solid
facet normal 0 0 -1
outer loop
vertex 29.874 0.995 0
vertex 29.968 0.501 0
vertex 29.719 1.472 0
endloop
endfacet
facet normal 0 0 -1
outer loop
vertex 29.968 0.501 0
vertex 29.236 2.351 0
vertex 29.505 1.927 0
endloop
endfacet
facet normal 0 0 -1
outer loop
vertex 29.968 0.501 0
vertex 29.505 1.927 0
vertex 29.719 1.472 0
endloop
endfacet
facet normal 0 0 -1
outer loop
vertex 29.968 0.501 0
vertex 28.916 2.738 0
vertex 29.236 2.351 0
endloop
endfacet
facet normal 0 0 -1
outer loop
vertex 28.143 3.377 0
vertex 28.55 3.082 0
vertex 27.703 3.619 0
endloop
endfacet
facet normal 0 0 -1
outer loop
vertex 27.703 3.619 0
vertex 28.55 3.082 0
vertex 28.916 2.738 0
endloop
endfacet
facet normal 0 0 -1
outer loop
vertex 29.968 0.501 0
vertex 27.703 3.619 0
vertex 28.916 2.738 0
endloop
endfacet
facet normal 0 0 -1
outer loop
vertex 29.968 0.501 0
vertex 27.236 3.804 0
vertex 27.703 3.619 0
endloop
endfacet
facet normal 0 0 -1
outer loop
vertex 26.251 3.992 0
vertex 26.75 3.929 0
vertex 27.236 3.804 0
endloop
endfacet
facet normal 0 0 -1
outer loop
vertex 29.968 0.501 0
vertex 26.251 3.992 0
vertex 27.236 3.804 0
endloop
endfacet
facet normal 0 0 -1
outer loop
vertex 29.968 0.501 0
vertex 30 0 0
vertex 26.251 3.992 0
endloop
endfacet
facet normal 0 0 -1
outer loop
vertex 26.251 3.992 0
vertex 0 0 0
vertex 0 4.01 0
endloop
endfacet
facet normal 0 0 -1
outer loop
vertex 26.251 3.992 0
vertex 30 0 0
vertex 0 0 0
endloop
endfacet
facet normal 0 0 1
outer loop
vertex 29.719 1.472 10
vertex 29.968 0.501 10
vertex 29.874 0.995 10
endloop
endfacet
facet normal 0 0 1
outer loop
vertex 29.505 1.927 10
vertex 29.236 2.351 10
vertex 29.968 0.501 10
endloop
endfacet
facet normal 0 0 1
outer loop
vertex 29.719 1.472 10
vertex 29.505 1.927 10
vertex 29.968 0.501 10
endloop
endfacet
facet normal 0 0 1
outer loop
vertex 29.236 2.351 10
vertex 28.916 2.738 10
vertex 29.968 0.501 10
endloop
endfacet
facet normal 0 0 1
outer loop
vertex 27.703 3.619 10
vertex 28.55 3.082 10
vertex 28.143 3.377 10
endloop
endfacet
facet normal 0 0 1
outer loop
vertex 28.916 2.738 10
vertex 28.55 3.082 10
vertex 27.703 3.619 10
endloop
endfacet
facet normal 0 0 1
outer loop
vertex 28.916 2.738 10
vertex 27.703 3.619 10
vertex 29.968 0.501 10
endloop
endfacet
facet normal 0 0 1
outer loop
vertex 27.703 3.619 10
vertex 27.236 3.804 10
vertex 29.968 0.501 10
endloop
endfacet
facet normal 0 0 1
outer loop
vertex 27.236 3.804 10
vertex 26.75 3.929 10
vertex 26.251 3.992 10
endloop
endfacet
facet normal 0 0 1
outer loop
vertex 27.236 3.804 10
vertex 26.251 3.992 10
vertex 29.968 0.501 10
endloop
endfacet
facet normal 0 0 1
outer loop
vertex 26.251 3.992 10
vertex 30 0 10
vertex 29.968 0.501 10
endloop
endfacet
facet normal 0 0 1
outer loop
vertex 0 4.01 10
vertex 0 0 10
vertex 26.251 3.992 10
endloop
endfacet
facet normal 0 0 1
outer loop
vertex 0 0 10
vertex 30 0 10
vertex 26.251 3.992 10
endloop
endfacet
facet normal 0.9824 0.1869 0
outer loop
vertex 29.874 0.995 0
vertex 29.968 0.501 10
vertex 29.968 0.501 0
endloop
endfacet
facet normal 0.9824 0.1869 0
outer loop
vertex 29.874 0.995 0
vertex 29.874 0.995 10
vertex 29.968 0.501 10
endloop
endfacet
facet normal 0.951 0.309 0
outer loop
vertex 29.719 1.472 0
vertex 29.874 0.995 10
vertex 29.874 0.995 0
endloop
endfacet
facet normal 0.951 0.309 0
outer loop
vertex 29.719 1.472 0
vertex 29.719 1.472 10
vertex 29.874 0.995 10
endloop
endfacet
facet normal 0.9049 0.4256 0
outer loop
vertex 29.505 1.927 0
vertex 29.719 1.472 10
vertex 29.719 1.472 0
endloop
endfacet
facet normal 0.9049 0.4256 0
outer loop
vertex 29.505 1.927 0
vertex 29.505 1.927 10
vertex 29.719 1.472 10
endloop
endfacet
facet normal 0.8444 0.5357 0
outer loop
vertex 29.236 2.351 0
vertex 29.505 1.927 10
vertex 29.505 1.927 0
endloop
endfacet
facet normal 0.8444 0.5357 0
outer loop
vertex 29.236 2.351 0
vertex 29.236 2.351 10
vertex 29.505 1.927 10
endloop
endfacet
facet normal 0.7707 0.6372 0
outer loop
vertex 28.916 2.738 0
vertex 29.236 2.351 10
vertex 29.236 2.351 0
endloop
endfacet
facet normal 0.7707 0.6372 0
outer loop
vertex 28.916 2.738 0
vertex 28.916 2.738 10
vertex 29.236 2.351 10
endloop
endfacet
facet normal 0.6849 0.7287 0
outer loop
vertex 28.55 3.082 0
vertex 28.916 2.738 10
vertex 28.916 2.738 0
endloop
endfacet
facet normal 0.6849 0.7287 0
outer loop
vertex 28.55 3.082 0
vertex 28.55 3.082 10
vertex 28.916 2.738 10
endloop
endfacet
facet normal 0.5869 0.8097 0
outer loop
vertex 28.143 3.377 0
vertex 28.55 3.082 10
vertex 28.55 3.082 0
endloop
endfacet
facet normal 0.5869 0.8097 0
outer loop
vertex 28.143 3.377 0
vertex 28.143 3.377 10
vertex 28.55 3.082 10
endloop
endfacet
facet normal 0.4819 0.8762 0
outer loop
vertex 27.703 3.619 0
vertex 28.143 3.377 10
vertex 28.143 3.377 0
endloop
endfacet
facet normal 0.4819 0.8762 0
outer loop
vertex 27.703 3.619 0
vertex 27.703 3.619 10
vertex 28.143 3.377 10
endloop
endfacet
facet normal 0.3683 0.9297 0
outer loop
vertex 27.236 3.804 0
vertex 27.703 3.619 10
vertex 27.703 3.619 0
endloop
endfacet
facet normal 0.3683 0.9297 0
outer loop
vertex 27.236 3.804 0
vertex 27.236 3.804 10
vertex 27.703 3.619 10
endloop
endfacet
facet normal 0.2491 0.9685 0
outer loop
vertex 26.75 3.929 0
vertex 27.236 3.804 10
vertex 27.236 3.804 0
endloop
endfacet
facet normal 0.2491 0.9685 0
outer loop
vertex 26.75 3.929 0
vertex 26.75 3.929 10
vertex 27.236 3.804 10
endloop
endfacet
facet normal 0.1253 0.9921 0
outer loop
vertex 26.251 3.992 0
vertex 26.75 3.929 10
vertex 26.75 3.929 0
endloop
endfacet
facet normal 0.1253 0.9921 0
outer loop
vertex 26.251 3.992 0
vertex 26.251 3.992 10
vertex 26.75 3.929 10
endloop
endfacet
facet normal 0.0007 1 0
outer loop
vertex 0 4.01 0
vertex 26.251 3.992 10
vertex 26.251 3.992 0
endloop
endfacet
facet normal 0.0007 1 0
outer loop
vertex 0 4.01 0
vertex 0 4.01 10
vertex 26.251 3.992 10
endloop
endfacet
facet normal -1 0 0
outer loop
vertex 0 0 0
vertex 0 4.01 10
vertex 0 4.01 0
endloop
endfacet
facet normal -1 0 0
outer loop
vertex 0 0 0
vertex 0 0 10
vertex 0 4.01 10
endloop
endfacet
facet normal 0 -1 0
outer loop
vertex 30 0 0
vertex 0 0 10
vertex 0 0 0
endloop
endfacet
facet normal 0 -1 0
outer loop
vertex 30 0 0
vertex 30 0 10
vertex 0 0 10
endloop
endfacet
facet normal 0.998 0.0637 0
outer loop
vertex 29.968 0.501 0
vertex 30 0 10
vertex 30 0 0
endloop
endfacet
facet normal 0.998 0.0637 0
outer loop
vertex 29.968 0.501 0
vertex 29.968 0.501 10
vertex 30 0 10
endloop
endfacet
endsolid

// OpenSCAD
corner_radius = 4;
thickness = 10;
base_width = 30;

module base() {
	hull() {
		translate([0, - corner_radius])
			circle(r=0.01, $fn=50);
		translate([0, corner_radius])
			circle(r=0.01, $fn=50);
		translate([base_width - corner_radius, 0])
			circle(r=corner_radius, $fn=50);
	};
};

module halfbase() {
	intersection() {
		base();
		square([999, 999]);
	}
}

linear_extrude(thickness) halfbase();
